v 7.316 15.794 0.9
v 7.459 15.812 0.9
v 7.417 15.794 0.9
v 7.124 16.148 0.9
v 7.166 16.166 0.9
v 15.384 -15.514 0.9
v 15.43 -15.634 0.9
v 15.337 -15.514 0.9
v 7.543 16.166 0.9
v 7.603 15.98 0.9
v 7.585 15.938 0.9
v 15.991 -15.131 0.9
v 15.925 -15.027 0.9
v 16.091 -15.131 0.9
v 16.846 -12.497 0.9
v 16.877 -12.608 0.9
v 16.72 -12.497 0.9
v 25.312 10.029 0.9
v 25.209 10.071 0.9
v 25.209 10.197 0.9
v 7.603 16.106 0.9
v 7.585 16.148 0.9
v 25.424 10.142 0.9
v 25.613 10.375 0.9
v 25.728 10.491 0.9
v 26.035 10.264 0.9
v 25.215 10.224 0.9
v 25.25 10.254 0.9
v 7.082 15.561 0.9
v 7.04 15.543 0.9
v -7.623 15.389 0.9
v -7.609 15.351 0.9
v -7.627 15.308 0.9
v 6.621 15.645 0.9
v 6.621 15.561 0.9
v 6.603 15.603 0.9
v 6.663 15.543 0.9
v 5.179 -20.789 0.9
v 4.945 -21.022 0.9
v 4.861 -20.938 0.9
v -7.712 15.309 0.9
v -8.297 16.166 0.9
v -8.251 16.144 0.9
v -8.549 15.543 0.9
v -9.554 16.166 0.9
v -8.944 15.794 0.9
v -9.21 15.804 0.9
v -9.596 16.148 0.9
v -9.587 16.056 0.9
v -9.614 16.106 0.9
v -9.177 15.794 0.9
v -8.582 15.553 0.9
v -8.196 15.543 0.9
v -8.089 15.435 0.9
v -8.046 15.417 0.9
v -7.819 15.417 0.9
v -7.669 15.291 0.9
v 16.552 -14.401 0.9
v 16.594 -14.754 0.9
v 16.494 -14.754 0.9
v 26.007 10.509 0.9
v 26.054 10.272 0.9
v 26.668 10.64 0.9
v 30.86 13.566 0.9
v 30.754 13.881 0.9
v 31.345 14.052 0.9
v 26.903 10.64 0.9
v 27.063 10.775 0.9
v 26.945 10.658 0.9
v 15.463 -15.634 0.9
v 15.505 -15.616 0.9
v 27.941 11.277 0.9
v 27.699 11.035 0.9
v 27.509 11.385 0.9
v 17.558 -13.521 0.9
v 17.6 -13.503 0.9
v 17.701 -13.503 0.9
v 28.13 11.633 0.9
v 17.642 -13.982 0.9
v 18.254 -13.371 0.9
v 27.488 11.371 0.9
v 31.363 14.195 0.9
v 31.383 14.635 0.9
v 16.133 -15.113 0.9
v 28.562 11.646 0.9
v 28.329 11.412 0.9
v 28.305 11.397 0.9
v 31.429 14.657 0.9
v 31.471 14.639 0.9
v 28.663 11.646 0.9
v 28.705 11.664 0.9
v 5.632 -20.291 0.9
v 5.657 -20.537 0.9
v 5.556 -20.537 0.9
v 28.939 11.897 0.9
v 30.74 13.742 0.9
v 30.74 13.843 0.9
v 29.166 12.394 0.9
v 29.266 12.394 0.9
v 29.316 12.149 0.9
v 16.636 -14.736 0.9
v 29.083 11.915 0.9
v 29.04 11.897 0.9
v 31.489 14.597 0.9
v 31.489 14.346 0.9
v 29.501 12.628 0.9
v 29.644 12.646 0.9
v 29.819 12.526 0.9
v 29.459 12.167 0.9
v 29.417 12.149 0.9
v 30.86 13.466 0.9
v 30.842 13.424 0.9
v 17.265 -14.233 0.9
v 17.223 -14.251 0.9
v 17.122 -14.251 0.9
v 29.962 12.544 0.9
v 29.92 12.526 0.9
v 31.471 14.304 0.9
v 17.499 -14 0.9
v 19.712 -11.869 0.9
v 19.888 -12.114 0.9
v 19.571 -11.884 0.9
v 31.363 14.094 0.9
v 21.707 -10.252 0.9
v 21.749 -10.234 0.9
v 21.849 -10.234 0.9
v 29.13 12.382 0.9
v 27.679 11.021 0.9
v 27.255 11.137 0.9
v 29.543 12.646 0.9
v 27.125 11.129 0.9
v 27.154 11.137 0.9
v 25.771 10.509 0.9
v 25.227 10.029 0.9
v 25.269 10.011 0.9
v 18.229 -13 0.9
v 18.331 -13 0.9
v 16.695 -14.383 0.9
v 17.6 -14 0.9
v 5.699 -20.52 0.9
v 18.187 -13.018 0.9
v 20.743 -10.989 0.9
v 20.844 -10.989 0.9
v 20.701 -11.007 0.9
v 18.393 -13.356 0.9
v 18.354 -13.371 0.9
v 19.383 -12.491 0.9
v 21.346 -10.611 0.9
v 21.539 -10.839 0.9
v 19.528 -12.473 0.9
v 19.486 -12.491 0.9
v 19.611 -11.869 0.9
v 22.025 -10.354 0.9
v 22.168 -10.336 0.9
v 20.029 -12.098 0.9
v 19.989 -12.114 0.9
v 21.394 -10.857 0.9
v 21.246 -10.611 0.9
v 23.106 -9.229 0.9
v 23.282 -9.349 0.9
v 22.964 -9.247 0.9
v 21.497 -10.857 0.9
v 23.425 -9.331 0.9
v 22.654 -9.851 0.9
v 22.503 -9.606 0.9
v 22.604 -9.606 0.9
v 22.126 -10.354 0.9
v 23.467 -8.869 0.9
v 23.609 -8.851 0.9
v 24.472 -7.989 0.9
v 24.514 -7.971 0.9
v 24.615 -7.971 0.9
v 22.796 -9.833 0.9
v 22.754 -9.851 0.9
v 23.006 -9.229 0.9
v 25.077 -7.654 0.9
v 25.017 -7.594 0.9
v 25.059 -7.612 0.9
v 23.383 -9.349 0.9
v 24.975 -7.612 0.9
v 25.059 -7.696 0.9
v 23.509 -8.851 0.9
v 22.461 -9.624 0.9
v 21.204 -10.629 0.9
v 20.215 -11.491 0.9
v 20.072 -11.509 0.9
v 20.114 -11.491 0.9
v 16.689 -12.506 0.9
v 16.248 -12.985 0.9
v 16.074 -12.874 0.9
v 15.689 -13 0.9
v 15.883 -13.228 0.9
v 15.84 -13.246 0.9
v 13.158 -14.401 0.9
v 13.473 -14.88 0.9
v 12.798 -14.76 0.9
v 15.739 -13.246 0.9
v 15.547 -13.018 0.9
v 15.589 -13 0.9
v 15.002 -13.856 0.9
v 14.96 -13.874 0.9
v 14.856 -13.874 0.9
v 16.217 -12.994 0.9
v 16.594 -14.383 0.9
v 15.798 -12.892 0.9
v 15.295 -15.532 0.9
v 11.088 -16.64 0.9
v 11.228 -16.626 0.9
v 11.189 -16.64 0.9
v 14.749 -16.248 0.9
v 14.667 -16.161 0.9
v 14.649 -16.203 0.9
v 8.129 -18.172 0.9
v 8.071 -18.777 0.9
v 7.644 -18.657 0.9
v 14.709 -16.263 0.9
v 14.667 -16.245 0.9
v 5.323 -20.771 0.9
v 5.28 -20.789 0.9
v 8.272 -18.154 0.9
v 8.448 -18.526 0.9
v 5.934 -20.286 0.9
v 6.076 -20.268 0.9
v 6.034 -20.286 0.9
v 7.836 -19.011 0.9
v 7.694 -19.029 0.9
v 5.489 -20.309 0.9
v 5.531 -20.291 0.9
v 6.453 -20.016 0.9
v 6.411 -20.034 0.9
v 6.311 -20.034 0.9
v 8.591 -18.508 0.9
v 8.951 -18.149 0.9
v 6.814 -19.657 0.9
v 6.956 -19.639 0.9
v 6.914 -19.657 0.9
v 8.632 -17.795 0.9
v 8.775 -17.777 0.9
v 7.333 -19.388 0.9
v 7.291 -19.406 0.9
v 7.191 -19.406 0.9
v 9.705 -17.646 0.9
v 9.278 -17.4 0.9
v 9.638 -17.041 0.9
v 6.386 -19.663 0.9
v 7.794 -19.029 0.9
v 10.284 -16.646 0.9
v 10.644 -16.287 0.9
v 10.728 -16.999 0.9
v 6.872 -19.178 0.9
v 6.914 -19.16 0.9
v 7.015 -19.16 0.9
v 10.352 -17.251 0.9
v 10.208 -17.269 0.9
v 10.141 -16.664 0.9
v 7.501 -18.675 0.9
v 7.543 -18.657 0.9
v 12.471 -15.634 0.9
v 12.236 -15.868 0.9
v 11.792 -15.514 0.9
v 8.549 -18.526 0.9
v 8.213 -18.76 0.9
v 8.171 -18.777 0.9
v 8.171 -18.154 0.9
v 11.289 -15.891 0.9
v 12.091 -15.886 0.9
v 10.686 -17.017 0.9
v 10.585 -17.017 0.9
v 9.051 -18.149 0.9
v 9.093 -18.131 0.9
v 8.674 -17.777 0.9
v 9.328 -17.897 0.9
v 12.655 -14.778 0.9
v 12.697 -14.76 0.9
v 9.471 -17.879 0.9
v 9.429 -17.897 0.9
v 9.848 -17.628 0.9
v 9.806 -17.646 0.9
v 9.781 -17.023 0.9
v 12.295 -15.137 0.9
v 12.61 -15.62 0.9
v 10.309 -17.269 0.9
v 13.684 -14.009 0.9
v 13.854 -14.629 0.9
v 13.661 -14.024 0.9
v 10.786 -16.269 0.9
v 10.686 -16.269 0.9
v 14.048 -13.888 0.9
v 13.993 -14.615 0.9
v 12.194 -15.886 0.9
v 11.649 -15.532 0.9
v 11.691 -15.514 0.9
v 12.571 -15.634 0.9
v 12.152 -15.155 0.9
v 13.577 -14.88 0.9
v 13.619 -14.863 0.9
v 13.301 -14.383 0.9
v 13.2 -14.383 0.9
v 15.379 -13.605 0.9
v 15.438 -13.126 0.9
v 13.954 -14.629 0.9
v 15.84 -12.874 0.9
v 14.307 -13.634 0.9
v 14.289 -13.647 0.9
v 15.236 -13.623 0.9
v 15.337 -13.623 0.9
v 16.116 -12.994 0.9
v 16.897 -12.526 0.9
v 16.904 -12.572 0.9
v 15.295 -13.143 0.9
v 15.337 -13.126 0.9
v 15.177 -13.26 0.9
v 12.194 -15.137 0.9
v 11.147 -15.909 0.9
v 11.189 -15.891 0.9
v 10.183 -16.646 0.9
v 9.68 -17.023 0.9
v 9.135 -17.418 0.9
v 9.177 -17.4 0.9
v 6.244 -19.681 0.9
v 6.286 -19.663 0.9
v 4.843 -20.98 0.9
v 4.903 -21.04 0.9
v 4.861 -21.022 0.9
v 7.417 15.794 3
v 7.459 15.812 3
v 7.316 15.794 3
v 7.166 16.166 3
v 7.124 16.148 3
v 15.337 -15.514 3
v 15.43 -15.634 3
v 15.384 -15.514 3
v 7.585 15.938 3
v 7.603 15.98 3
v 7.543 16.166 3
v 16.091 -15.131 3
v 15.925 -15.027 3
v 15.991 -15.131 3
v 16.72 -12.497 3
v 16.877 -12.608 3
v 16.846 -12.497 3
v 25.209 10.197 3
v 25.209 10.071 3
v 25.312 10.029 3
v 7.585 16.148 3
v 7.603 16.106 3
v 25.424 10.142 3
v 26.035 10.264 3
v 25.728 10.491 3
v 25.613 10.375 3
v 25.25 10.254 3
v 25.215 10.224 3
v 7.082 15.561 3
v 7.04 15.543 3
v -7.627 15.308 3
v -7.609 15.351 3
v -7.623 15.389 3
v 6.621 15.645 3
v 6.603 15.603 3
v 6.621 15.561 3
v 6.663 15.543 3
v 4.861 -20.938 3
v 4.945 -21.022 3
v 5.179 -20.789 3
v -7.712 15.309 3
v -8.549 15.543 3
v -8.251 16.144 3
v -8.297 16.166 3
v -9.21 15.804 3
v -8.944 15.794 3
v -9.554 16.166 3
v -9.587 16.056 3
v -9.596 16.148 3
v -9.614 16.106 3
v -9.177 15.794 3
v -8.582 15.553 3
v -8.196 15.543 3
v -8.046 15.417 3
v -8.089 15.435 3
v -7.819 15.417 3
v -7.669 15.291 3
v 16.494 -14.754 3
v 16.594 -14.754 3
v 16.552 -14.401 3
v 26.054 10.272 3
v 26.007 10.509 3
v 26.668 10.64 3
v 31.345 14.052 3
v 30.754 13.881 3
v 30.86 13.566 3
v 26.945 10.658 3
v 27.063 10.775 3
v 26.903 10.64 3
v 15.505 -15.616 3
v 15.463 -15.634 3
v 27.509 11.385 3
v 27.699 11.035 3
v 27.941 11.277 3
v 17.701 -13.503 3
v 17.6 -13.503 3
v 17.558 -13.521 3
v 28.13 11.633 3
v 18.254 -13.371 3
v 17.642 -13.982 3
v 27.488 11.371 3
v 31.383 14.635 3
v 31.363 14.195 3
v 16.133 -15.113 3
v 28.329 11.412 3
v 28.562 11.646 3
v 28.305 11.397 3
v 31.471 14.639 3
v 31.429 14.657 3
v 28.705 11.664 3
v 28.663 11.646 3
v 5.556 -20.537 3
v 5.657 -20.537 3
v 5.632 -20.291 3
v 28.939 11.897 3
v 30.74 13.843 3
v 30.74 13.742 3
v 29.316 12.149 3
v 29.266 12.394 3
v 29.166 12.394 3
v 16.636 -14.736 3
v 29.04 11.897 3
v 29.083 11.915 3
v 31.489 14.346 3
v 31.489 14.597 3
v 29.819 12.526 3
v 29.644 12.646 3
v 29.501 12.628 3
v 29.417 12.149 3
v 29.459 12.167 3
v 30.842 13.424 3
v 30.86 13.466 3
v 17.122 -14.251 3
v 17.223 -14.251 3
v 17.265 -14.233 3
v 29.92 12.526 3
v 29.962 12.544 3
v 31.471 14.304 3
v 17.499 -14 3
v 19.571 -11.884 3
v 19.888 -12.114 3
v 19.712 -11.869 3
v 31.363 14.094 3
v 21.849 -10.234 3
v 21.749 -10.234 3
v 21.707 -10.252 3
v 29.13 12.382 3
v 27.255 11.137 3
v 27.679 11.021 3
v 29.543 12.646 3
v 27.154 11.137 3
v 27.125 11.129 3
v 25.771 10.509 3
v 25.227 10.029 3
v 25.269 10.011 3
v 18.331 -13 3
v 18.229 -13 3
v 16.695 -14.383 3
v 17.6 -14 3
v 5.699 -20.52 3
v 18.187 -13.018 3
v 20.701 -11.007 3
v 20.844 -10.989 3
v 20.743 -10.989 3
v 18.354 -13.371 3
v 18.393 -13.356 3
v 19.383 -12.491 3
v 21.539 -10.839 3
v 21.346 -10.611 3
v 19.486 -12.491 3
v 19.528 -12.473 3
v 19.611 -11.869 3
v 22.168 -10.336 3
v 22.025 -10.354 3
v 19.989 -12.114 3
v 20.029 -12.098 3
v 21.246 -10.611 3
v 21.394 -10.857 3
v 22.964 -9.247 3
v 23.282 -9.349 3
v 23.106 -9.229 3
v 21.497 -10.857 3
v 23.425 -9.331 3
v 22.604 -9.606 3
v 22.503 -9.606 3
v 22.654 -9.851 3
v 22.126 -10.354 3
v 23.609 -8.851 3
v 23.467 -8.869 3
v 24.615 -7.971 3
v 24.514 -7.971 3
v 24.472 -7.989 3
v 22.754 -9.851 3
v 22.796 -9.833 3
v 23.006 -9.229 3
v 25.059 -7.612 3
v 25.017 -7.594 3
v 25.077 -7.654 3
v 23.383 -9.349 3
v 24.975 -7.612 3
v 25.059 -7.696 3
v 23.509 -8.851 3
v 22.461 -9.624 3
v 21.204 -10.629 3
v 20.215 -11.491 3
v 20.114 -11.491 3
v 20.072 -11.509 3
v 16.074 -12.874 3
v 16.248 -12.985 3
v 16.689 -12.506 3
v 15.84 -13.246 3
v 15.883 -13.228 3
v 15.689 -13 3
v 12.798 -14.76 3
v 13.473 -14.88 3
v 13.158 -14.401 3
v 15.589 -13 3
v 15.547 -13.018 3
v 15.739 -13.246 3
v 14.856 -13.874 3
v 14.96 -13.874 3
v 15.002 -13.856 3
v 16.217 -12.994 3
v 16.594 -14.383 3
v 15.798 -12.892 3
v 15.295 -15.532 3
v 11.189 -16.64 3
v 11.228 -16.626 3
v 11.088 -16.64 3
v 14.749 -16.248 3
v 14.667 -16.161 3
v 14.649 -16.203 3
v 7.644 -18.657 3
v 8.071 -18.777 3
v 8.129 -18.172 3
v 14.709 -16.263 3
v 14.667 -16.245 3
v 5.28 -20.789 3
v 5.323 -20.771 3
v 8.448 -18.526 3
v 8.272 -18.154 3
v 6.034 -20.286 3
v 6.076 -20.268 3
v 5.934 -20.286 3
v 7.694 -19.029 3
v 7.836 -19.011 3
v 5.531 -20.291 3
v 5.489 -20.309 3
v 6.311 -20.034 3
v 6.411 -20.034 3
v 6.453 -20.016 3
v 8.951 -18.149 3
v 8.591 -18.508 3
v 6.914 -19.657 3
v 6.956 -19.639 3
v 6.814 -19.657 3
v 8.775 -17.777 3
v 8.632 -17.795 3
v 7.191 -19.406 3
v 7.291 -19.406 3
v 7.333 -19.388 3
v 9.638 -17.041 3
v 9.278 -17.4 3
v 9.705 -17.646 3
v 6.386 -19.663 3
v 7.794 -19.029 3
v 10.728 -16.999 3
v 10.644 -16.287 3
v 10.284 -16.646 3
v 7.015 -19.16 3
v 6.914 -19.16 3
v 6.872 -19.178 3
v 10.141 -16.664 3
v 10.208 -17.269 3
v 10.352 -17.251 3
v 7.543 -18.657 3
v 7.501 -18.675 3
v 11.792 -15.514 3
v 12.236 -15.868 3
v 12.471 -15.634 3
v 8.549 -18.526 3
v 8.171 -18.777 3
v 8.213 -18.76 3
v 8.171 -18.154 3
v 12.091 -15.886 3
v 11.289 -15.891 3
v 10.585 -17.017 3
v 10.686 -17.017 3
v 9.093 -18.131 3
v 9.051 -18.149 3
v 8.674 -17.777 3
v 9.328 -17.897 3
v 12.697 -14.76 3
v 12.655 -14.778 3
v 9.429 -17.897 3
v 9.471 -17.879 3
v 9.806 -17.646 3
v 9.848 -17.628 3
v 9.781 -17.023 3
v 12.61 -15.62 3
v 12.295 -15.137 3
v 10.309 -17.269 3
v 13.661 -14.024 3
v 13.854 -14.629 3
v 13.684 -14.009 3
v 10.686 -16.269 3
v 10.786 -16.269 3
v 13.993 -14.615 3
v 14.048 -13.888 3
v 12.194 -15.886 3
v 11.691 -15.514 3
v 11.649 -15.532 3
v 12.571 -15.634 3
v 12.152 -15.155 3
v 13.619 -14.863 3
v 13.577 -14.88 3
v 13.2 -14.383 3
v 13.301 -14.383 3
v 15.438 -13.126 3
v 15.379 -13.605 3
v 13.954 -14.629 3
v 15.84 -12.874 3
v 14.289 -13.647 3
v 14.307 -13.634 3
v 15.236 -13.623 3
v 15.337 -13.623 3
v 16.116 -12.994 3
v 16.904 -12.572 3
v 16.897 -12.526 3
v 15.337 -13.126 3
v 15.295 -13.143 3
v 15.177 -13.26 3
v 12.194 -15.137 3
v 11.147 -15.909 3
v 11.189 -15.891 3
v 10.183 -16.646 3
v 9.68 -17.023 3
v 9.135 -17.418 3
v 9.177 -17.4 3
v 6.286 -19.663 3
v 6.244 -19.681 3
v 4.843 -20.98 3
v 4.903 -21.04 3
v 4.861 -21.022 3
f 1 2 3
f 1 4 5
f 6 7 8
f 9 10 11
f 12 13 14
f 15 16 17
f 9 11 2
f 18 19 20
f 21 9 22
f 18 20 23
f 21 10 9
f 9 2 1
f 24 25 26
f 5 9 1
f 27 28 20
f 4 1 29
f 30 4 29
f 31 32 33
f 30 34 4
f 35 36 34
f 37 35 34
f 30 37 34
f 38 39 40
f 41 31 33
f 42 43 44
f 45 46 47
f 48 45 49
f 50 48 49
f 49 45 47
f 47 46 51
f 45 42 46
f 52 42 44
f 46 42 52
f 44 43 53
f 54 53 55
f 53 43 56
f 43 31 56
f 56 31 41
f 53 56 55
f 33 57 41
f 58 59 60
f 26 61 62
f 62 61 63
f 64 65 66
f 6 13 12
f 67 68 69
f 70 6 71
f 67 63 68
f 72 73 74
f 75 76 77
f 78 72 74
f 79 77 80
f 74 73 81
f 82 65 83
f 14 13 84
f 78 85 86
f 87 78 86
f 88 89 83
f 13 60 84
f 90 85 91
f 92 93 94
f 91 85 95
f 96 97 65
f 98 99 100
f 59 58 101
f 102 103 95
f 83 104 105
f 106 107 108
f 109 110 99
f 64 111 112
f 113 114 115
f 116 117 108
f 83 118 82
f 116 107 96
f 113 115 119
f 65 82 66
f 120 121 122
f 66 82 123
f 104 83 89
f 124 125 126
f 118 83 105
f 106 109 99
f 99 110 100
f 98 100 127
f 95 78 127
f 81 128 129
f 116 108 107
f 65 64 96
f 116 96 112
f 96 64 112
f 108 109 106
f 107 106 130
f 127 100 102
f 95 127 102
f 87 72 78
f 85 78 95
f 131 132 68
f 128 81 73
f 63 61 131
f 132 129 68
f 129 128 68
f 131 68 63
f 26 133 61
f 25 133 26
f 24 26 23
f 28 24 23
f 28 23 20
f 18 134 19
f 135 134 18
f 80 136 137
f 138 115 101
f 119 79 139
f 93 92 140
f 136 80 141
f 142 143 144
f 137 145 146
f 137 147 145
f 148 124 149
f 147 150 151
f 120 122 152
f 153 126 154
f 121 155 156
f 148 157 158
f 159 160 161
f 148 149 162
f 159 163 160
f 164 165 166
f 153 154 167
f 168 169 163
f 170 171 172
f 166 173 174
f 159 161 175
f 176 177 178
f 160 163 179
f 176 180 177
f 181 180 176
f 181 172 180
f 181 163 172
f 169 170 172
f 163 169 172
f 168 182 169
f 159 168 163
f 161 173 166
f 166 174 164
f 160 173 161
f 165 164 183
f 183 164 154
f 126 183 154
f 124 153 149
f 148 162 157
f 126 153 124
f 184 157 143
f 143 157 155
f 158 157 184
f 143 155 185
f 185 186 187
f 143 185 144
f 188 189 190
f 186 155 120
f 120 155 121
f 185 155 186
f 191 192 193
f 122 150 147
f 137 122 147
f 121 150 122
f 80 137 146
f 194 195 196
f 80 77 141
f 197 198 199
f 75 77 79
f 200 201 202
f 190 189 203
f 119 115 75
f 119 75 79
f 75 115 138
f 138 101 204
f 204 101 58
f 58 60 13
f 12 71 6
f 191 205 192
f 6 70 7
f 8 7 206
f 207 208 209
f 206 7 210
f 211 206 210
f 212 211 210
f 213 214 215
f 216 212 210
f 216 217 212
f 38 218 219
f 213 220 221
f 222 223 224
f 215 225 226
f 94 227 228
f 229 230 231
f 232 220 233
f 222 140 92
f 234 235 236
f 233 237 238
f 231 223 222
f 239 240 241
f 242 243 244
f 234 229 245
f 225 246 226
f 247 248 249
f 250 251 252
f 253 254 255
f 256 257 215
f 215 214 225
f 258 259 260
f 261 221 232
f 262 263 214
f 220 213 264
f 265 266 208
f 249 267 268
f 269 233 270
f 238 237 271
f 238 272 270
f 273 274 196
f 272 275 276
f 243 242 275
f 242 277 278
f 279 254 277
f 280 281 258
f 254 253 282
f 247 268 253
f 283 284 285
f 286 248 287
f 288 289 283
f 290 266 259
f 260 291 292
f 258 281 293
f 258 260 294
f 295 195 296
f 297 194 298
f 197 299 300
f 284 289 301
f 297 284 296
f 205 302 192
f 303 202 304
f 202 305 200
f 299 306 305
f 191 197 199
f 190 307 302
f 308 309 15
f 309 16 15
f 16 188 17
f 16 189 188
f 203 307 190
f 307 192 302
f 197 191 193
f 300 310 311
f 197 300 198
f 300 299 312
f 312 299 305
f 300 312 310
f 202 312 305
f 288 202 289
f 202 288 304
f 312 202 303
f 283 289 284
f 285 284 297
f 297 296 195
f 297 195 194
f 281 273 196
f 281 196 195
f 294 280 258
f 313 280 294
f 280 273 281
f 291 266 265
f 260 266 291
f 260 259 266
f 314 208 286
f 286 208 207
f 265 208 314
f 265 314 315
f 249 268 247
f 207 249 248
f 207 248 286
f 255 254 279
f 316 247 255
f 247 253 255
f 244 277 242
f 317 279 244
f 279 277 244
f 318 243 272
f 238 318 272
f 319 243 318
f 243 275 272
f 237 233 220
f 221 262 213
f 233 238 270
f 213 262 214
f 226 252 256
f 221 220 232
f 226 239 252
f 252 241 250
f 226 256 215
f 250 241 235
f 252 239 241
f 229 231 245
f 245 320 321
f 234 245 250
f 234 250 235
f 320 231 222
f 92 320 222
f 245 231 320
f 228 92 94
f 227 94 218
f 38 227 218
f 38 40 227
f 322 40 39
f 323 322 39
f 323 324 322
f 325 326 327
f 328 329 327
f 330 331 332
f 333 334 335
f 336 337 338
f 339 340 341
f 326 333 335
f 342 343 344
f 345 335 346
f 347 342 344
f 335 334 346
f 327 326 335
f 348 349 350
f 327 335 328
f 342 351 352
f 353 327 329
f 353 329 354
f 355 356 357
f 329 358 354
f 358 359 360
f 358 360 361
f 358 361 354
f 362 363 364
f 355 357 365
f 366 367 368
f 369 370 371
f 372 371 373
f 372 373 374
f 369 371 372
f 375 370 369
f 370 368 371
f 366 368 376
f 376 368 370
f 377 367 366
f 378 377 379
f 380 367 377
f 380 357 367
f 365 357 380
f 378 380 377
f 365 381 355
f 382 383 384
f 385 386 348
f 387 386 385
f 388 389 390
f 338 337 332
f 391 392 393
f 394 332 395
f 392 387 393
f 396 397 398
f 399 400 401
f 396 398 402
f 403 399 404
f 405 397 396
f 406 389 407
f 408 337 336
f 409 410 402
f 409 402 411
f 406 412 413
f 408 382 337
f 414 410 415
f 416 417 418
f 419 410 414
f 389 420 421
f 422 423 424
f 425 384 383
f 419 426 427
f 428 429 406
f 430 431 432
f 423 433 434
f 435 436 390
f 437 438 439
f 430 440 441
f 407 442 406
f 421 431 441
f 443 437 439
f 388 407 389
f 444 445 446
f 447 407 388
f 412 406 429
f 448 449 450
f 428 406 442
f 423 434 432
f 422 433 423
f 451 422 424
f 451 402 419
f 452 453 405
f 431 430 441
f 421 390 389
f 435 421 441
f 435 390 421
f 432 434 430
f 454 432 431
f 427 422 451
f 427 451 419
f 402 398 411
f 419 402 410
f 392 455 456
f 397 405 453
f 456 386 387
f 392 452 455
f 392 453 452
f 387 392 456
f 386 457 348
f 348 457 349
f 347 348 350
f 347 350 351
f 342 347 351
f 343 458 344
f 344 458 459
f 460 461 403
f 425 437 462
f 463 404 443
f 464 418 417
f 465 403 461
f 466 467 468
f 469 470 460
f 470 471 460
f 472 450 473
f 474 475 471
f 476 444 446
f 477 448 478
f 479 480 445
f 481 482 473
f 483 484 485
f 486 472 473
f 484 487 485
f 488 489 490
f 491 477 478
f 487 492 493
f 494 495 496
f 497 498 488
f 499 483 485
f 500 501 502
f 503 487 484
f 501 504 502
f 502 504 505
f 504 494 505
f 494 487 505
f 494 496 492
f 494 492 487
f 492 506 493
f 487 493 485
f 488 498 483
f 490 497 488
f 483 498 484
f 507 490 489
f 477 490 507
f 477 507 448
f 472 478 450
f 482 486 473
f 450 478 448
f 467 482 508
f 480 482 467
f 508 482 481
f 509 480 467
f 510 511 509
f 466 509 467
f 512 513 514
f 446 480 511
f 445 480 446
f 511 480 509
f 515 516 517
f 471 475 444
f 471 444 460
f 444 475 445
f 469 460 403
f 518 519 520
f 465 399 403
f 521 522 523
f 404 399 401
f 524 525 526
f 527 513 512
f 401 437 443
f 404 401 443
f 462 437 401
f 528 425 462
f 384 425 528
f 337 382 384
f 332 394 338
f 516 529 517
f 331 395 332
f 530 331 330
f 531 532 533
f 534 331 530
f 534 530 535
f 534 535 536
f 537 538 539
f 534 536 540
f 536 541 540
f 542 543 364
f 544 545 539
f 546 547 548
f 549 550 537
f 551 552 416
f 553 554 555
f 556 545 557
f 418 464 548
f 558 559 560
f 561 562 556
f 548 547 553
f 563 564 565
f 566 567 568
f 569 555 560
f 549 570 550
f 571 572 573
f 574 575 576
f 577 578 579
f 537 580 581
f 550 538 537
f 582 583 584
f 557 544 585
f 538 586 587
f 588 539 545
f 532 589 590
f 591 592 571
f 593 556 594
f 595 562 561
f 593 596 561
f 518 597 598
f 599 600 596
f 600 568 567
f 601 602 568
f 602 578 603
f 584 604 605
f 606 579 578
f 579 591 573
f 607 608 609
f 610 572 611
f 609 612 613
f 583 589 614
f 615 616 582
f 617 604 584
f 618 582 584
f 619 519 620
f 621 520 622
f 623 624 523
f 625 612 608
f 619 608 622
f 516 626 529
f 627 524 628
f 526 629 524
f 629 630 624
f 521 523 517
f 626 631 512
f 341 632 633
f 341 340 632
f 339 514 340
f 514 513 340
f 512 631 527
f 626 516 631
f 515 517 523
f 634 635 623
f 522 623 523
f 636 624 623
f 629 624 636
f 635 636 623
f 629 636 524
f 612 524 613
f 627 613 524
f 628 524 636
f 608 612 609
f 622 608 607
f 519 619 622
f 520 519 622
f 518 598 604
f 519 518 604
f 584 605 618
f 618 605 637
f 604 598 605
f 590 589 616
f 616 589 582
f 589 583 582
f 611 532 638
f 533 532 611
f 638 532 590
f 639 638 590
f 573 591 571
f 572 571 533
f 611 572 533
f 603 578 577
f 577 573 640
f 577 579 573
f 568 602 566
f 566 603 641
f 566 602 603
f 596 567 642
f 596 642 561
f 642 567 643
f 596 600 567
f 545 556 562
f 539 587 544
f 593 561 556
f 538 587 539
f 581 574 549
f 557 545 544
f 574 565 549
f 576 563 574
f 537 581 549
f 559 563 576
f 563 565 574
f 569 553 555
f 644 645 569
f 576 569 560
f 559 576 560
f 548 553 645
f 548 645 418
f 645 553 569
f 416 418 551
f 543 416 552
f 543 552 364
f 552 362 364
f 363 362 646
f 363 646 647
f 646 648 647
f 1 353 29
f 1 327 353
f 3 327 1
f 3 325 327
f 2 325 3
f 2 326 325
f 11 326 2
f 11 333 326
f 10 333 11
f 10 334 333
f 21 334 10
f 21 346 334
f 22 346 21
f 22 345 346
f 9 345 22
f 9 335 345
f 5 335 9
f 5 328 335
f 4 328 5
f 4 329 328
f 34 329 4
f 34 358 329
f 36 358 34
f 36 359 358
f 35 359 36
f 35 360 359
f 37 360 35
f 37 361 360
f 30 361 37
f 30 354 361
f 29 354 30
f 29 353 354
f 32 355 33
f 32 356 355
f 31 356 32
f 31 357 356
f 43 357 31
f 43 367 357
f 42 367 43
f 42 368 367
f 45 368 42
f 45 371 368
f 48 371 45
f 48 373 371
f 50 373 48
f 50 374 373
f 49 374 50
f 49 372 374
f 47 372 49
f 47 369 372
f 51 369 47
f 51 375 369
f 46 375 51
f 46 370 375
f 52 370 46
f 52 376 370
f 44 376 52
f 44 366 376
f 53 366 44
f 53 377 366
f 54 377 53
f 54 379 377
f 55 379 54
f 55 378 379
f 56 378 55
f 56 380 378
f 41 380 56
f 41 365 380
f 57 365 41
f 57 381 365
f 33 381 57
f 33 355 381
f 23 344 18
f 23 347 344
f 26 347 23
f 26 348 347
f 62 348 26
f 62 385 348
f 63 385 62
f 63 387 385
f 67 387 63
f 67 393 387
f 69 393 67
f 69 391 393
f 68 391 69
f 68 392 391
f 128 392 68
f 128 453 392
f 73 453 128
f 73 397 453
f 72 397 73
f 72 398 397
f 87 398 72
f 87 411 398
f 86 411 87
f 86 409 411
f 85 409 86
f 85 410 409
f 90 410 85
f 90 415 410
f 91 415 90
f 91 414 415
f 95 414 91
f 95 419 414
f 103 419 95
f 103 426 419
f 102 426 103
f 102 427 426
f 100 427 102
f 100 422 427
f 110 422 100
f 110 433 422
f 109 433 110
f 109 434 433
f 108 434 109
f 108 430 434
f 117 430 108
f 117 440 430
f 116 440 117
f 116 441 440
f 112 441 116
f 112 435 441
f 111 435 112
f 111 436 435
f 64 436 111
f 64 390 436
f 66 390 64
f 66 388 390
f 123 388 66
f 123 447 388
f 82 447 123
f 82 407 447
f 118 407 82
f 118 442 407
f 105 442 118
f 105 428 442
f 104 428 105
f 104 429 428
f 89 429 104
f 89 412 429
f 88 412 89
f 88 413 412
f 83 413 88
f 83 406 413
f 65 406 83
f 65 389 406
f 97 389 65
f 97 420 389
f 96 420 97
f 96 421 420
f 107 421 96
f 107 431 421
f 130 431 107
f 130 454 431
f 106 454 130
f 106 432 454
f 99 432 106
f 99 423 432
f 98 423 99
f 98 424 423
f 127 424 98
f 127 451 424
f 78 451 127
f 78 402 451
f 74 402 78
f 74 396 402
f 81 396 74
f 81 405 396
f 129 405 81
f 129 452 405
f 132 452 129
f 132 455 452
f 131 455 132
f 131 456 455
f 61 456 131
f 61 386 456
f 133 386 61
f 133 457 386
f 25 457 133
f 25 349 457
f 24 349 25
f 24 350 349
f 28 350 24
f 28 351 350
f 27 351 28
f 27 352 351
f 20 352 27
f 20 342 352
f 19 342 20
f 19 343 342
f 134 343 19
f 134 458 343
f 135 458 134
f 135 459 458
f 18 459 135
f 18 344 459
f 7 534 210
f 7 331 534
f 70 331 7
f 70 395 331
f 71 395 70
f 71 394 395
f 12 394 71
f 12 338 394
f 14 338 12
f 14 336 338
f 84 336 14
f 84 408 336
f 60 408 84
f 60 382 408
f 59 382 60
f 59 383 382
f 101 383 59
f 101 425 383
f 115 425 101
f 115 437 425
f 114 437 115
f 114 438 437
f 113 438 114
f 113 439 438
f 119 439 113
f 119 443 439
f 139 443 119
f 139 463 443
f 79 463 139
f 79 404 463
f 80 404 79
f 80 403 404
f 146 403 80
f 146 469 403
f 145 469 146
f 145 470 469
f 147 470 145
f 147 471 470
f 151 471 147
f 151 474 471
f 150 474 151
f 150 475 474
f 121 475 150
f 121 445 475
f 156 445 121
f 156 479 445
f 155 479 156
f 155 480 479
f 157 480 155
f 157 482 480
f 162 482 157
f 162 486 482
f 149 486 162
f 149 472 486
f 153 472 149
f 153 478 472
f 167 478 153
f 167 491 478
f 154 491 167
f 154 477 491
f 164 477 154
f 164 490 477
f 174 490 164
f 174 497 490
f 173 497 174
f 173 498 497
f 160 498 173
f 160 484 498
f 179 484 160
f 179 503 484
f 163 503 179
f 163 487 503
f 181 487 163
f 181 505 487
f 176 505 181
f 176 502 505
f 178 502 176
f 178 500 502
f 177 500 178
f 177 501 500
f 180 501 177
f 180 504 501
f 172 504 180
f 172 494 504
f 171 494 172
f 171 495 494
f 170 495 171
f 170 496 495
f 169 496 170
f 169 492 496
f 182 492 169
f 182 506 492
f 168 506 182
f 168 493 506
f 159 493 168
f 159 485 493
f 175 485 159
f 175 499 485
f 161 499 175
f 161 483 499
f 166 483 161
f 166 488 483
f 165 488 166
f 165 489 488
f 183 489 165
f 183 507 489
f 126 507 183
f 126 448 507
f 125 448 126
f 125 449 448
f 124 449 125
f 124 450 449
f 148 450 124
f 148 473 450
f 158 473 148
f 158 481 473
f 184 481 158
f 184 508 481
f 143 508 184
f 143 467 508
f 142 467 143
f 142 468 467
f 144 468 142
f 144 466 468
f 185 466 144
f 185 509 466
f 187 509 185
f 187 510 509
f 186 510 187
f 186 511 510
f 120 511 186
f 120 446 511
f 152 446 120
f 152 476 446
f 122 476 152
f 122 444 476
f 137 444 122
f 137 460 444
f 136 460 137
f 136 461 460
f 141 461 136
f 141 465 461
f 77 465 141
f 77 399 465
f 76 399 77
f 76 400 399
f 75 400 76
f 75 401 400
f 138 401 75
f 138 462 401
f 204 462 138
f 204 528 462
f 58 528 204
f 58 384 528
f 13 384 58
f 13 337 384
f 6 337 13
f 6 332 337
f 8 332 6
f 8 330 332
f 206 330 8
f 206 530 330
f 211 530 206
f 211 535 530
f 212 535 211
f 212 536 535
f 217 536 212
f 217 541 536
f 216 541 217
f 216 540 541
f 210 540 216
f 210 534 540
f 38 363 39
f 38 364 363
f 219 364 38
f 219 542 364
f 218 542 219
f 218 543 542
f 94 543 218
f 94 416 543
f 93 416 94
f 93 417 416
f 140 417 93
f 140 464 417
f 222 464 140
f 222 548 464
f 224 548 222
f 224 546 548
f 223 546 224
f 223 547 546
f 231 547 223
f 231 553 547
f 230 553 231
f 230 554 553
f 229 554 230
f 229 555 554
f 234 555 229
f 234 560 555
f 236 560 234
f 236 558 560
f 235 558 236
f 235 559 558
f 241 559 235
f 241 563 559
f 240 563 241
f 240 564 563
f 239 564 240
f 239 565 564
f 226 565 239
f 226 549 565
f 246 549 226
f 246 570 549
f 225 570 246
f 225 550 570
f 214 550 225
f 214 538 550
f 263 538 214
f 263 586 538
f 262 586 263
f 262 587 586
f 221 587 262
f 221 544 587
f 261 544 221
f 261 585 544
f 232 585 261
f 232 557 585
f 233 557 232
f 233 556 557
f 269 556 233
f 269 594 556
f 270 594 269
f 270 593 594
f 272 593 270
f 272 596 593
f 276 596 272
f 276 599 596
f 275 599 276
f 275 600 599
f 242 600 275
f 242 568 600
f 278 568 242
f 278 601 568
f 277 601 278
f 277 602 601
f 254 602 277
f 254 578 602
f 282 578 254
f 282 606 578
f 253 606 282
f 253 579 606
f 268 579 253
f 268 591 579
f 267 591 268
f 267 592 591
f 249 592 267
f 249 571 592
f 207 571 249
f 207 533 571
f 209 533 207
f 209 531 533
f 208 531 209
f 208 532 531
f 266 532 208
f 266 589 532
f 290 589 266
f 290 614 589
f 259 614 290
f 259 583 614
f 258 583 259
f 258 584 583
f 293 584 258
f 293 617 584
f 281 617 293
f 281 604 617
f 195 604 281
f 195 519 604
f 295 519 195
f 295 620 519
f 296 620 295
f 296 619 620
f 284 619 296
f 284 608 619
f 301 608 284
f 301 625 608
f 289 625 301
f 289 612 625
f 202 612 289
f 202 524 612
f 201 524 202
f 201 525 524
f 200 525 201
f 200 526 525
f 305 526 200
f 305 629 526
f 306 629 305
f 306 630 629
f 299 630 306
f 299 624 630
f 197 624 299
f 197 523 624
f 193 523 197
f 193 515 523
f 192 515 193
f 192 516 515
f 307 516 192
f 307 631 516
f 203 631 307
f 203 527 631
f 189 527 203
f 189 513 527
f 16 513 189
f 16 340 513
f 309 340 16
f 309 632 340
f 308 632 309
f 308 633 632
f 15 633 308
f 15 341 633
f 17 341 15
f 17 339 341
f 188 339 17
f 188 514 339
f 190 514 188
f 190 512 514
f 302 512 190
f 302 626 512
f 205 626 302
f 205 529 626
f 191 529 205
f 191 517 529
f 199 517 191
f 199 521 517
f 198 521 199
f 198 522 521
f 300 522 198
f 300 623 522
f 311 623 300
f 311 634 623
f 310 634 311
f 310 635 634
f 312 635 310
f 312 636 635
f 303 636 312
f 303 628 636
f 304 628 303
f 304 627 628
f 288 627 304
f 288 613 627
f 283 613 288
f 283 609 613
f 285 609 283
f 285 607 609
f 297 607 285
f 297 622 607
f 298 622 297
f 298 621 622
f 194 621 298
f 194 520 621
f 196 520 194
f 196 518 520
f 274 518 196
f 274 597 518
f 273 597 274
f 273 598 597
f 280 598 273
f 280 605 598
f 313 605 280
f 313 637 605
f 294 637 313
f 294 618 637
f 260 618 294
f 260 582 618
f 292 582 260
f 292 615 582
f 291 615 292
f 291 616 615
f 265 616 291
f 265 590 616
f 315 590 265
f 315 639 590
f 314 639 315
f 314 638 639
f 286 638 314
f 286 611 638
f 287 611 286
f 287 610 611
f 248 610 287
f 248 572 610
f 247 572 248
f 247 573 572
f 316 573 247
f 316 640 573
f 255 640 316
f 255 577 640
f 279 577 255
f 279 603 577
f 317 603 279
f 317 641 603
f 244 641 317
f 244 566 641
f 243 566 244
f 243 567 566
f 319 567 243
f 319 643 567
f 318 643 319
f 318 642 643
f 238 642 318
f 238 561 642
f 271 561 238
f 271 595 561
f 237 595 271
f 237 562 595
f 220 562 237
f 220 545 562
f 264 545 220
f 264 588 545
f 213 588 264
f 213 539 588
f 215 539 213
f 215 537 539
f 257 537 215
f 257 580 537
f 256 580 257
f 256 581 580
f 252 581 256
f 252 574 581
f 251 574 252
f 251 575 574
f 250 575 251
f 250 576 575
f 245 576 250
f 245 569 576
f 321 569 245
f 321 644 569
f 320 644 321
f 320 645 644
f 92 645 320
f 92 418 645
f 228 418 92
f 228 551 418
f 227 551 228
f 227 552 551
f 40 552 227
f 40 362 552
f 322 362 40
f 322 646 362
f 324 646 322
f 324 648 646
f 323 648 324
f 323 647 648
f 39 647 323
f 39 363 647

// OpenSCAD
$fn = 24;
translate([0, -2.500, 0.900])
  linear_extrude(height=2.100) {
offset(r=0.06, $fn=8) {
    polygon(points=[[16.846,-10.057],[16.720,-10.057],[16.091,-10.434],[15.840,-10.434],[15.714,-10.560],[15.589,-10.560],[15.463,-10.686],[15.337,-10.686],[15.211,-10.811],[14.331,-11.189],[14.080,-11.440],[13.703,-11.566],[13.326,-11.943],[13.200,-11.943],[12.823,-12.320],[12.697,-12.320],[12.320,-12.697],[12.194,-12.697],[11.817,-13.074],[11.691,-13.074],[11.314,-13.451],[11.189,-13.451],[10.811,-13.829],[10.686,-13.829],[10.309,-14.206],[10.183,-14.206],[9.806,-14.583],[9.680,-14.583],[9.303,-14.960],[9.177,-14.960],[8.800,-15.337],[8.674,-15.337],[8.297,-15.714],[8.171,-15.714],[7.669,-16.217],[7.543,-16.217],[7.040,-16.720],[6.914,-16.720],[6.411,-17.223],[6.286,-17.223],[5.657,-17.851],[5.531,-17.851],[4.903,-18.480],[4.777,-18.480],[4.526,-18.731],[4.777,-18.480],[4.903,-18.480],[5.154,-18.229],[5.280,-18.229],[5.531,-17.977],[5.657,-17.977],[5.909,-17.726],[6.034,-17.726],[6.286,-17.474],[6.411,-17.474],[6.789,-17.097],[6.914,-17.097],[7.166,-16.846],[7.291,-16.846],[7.669,-16.469],[7.794,-16.469],[8.046,-16.217],[8.171,-16.217],[8.423,-15.966],[8.549,-15.966],[8.926,-15.589],[9.051,-15.589],[9.303,-15.337],[9.429,-15.337],[9.680,-15.086],[9.806,-15.086],[10.183,-14.709],[10.309,-14.709],[10.560,-14.457],[10.686,-14.457],[11.063,-14.080],[11.189,-14.080],[12.069,-13.326],[12.194,-13.326],[12.446,-13.074],[12.571,-13.074],[13.451,-12.320],[13.577,-12.320],[13.829,-12.069],[13.954,-12.069],[14.834,-11.314],[14.960,-11.314],[15.211,-11.063],[15.337,-11.063],[15.714,-10.686],[15.840,-10.686],[16.091,-10.434],[16.217,-10.434]], paths=[[0,1,2,3,4,5,6,7,8,9,10,11,12,13,14,15,16,17,18,19,20,21,22,23,24,25,26,27,28,29,30,31,32,33,34,35,36,37,38,39,40,41,42,43,44,45,46,47,48,49,50,51,52,53,54,55,56,57,58,59,60,61,62,63,64,65,66,67,68,69,70,71,72,73,74,75,76,77,78,79,80,81,82,83,84,85,86,87,88,89,90,91,92]]);
    polygon(points=[[25.017,-5.154],[24.640,-5.531],[24.514,-5.531],[23.634,-6.411],[23.509,-6.411],[23.131,-6.789],[23.006,-6.789],[22.629,-7.166],[22.503,-7.166],[21.874,-7.794],[21.749,-7.794],[21.371,-8.171],[21.246,-8.171],[20.869,-8.549],[20.743,-8.549],[20.240,-9.051],[20.114,-9.051],[19.737,-9.429],[19.611,-9.429],[18.354,-10.560],[18.229,-10.560],[17.726,-11.063],[17.600,-11.063],[16.720,-11.943],[16.594,-11.943],[15.463,-13.074],[15.337,-13.074],[14.709,-13.703],[15.966,-12.571],[16.091,-12.571],[16.469,-12.194],[16.594,-12.194],[17.097,-11.691],[17.223,-11.691],[17.474,-11.440],[17.600,-11.440],[18.229,-10.811],[18.354,-10.811],[19.360,-9.931],[19.486,-9.931],[19.863,-9.554],[19.989,-9.554],[21.371,-8.297],[21.497,-8.297],[22.000,-7.794],[22.126,-7.794],[22.629,-7.291],[22.754,-7.291],[23.257,-6.789],[23.383,-6.789]], paths=[[0,1,2,3,4,5,6,7,8,9,10,11,12,13,14,15,16,17,18,19,20,21,22,23,24,25,26,27,28,29,30,31,32,33,34,35,36,37,38,39,40,41,42,43,44,45,46,47,48,49]]);
    polygon(points=[[31.429,17.097],[30.800,16.343],[30.800,16.217],[29.669,15.086],[29.543,15.086],[29.291,14.834],[29.166,14.834],[28.160,14.080],[27.531,13.829],[27.280,13.577],[27.154,13.577],[26.023,12.949],[25.771,12.949],[25.646,12.823],[25.269,12.697],[25.269,12.571],[25.394,12.697],[26.023,12.823],[26.651,13.200],[26.903,13.200],[27.029,13.326],[27.657,13.577],[27.909,13.829],[28.286,13.954],[28.537,14.206],[28.663,14.206],[28.914,14.457],[29.040,14.457],[29.291,14.709],[29.417,14.709],[29.794,15.086],[29.920,15.086],[30.800,15.966],[30.800,16.091],[31.303,16.594],[31.303,16.720],[31.429,16.846]], paths=[[0,1,2,3,4,5,6,7,8,9,10,11,12,13,14,15,16,17,18,19,20,21,22,23,24,25,26,27,28,29,30,31,32,33,34,35,36]]);
    polygon(points=[[7.543,18.606],[7.166,18.606],[6.663,18.103],[7.040,18.103],[7.291,18.354],[7.417,18.354],[7.543,18.480]], paths=[[0,1,2,3,4,5,6]]);
    polygon(points=[[-9.554,18.606],[-9.177,18.354],[-8.926,18.354],[-8.549,18.103],[-8.171,18.103],[-8.046,17.977],[-7.794,17.977],[-7.669,17.851],[-8.297,18.606]], paths=[[0,1,2,3,4,5,6,7,8]]);
}
}
